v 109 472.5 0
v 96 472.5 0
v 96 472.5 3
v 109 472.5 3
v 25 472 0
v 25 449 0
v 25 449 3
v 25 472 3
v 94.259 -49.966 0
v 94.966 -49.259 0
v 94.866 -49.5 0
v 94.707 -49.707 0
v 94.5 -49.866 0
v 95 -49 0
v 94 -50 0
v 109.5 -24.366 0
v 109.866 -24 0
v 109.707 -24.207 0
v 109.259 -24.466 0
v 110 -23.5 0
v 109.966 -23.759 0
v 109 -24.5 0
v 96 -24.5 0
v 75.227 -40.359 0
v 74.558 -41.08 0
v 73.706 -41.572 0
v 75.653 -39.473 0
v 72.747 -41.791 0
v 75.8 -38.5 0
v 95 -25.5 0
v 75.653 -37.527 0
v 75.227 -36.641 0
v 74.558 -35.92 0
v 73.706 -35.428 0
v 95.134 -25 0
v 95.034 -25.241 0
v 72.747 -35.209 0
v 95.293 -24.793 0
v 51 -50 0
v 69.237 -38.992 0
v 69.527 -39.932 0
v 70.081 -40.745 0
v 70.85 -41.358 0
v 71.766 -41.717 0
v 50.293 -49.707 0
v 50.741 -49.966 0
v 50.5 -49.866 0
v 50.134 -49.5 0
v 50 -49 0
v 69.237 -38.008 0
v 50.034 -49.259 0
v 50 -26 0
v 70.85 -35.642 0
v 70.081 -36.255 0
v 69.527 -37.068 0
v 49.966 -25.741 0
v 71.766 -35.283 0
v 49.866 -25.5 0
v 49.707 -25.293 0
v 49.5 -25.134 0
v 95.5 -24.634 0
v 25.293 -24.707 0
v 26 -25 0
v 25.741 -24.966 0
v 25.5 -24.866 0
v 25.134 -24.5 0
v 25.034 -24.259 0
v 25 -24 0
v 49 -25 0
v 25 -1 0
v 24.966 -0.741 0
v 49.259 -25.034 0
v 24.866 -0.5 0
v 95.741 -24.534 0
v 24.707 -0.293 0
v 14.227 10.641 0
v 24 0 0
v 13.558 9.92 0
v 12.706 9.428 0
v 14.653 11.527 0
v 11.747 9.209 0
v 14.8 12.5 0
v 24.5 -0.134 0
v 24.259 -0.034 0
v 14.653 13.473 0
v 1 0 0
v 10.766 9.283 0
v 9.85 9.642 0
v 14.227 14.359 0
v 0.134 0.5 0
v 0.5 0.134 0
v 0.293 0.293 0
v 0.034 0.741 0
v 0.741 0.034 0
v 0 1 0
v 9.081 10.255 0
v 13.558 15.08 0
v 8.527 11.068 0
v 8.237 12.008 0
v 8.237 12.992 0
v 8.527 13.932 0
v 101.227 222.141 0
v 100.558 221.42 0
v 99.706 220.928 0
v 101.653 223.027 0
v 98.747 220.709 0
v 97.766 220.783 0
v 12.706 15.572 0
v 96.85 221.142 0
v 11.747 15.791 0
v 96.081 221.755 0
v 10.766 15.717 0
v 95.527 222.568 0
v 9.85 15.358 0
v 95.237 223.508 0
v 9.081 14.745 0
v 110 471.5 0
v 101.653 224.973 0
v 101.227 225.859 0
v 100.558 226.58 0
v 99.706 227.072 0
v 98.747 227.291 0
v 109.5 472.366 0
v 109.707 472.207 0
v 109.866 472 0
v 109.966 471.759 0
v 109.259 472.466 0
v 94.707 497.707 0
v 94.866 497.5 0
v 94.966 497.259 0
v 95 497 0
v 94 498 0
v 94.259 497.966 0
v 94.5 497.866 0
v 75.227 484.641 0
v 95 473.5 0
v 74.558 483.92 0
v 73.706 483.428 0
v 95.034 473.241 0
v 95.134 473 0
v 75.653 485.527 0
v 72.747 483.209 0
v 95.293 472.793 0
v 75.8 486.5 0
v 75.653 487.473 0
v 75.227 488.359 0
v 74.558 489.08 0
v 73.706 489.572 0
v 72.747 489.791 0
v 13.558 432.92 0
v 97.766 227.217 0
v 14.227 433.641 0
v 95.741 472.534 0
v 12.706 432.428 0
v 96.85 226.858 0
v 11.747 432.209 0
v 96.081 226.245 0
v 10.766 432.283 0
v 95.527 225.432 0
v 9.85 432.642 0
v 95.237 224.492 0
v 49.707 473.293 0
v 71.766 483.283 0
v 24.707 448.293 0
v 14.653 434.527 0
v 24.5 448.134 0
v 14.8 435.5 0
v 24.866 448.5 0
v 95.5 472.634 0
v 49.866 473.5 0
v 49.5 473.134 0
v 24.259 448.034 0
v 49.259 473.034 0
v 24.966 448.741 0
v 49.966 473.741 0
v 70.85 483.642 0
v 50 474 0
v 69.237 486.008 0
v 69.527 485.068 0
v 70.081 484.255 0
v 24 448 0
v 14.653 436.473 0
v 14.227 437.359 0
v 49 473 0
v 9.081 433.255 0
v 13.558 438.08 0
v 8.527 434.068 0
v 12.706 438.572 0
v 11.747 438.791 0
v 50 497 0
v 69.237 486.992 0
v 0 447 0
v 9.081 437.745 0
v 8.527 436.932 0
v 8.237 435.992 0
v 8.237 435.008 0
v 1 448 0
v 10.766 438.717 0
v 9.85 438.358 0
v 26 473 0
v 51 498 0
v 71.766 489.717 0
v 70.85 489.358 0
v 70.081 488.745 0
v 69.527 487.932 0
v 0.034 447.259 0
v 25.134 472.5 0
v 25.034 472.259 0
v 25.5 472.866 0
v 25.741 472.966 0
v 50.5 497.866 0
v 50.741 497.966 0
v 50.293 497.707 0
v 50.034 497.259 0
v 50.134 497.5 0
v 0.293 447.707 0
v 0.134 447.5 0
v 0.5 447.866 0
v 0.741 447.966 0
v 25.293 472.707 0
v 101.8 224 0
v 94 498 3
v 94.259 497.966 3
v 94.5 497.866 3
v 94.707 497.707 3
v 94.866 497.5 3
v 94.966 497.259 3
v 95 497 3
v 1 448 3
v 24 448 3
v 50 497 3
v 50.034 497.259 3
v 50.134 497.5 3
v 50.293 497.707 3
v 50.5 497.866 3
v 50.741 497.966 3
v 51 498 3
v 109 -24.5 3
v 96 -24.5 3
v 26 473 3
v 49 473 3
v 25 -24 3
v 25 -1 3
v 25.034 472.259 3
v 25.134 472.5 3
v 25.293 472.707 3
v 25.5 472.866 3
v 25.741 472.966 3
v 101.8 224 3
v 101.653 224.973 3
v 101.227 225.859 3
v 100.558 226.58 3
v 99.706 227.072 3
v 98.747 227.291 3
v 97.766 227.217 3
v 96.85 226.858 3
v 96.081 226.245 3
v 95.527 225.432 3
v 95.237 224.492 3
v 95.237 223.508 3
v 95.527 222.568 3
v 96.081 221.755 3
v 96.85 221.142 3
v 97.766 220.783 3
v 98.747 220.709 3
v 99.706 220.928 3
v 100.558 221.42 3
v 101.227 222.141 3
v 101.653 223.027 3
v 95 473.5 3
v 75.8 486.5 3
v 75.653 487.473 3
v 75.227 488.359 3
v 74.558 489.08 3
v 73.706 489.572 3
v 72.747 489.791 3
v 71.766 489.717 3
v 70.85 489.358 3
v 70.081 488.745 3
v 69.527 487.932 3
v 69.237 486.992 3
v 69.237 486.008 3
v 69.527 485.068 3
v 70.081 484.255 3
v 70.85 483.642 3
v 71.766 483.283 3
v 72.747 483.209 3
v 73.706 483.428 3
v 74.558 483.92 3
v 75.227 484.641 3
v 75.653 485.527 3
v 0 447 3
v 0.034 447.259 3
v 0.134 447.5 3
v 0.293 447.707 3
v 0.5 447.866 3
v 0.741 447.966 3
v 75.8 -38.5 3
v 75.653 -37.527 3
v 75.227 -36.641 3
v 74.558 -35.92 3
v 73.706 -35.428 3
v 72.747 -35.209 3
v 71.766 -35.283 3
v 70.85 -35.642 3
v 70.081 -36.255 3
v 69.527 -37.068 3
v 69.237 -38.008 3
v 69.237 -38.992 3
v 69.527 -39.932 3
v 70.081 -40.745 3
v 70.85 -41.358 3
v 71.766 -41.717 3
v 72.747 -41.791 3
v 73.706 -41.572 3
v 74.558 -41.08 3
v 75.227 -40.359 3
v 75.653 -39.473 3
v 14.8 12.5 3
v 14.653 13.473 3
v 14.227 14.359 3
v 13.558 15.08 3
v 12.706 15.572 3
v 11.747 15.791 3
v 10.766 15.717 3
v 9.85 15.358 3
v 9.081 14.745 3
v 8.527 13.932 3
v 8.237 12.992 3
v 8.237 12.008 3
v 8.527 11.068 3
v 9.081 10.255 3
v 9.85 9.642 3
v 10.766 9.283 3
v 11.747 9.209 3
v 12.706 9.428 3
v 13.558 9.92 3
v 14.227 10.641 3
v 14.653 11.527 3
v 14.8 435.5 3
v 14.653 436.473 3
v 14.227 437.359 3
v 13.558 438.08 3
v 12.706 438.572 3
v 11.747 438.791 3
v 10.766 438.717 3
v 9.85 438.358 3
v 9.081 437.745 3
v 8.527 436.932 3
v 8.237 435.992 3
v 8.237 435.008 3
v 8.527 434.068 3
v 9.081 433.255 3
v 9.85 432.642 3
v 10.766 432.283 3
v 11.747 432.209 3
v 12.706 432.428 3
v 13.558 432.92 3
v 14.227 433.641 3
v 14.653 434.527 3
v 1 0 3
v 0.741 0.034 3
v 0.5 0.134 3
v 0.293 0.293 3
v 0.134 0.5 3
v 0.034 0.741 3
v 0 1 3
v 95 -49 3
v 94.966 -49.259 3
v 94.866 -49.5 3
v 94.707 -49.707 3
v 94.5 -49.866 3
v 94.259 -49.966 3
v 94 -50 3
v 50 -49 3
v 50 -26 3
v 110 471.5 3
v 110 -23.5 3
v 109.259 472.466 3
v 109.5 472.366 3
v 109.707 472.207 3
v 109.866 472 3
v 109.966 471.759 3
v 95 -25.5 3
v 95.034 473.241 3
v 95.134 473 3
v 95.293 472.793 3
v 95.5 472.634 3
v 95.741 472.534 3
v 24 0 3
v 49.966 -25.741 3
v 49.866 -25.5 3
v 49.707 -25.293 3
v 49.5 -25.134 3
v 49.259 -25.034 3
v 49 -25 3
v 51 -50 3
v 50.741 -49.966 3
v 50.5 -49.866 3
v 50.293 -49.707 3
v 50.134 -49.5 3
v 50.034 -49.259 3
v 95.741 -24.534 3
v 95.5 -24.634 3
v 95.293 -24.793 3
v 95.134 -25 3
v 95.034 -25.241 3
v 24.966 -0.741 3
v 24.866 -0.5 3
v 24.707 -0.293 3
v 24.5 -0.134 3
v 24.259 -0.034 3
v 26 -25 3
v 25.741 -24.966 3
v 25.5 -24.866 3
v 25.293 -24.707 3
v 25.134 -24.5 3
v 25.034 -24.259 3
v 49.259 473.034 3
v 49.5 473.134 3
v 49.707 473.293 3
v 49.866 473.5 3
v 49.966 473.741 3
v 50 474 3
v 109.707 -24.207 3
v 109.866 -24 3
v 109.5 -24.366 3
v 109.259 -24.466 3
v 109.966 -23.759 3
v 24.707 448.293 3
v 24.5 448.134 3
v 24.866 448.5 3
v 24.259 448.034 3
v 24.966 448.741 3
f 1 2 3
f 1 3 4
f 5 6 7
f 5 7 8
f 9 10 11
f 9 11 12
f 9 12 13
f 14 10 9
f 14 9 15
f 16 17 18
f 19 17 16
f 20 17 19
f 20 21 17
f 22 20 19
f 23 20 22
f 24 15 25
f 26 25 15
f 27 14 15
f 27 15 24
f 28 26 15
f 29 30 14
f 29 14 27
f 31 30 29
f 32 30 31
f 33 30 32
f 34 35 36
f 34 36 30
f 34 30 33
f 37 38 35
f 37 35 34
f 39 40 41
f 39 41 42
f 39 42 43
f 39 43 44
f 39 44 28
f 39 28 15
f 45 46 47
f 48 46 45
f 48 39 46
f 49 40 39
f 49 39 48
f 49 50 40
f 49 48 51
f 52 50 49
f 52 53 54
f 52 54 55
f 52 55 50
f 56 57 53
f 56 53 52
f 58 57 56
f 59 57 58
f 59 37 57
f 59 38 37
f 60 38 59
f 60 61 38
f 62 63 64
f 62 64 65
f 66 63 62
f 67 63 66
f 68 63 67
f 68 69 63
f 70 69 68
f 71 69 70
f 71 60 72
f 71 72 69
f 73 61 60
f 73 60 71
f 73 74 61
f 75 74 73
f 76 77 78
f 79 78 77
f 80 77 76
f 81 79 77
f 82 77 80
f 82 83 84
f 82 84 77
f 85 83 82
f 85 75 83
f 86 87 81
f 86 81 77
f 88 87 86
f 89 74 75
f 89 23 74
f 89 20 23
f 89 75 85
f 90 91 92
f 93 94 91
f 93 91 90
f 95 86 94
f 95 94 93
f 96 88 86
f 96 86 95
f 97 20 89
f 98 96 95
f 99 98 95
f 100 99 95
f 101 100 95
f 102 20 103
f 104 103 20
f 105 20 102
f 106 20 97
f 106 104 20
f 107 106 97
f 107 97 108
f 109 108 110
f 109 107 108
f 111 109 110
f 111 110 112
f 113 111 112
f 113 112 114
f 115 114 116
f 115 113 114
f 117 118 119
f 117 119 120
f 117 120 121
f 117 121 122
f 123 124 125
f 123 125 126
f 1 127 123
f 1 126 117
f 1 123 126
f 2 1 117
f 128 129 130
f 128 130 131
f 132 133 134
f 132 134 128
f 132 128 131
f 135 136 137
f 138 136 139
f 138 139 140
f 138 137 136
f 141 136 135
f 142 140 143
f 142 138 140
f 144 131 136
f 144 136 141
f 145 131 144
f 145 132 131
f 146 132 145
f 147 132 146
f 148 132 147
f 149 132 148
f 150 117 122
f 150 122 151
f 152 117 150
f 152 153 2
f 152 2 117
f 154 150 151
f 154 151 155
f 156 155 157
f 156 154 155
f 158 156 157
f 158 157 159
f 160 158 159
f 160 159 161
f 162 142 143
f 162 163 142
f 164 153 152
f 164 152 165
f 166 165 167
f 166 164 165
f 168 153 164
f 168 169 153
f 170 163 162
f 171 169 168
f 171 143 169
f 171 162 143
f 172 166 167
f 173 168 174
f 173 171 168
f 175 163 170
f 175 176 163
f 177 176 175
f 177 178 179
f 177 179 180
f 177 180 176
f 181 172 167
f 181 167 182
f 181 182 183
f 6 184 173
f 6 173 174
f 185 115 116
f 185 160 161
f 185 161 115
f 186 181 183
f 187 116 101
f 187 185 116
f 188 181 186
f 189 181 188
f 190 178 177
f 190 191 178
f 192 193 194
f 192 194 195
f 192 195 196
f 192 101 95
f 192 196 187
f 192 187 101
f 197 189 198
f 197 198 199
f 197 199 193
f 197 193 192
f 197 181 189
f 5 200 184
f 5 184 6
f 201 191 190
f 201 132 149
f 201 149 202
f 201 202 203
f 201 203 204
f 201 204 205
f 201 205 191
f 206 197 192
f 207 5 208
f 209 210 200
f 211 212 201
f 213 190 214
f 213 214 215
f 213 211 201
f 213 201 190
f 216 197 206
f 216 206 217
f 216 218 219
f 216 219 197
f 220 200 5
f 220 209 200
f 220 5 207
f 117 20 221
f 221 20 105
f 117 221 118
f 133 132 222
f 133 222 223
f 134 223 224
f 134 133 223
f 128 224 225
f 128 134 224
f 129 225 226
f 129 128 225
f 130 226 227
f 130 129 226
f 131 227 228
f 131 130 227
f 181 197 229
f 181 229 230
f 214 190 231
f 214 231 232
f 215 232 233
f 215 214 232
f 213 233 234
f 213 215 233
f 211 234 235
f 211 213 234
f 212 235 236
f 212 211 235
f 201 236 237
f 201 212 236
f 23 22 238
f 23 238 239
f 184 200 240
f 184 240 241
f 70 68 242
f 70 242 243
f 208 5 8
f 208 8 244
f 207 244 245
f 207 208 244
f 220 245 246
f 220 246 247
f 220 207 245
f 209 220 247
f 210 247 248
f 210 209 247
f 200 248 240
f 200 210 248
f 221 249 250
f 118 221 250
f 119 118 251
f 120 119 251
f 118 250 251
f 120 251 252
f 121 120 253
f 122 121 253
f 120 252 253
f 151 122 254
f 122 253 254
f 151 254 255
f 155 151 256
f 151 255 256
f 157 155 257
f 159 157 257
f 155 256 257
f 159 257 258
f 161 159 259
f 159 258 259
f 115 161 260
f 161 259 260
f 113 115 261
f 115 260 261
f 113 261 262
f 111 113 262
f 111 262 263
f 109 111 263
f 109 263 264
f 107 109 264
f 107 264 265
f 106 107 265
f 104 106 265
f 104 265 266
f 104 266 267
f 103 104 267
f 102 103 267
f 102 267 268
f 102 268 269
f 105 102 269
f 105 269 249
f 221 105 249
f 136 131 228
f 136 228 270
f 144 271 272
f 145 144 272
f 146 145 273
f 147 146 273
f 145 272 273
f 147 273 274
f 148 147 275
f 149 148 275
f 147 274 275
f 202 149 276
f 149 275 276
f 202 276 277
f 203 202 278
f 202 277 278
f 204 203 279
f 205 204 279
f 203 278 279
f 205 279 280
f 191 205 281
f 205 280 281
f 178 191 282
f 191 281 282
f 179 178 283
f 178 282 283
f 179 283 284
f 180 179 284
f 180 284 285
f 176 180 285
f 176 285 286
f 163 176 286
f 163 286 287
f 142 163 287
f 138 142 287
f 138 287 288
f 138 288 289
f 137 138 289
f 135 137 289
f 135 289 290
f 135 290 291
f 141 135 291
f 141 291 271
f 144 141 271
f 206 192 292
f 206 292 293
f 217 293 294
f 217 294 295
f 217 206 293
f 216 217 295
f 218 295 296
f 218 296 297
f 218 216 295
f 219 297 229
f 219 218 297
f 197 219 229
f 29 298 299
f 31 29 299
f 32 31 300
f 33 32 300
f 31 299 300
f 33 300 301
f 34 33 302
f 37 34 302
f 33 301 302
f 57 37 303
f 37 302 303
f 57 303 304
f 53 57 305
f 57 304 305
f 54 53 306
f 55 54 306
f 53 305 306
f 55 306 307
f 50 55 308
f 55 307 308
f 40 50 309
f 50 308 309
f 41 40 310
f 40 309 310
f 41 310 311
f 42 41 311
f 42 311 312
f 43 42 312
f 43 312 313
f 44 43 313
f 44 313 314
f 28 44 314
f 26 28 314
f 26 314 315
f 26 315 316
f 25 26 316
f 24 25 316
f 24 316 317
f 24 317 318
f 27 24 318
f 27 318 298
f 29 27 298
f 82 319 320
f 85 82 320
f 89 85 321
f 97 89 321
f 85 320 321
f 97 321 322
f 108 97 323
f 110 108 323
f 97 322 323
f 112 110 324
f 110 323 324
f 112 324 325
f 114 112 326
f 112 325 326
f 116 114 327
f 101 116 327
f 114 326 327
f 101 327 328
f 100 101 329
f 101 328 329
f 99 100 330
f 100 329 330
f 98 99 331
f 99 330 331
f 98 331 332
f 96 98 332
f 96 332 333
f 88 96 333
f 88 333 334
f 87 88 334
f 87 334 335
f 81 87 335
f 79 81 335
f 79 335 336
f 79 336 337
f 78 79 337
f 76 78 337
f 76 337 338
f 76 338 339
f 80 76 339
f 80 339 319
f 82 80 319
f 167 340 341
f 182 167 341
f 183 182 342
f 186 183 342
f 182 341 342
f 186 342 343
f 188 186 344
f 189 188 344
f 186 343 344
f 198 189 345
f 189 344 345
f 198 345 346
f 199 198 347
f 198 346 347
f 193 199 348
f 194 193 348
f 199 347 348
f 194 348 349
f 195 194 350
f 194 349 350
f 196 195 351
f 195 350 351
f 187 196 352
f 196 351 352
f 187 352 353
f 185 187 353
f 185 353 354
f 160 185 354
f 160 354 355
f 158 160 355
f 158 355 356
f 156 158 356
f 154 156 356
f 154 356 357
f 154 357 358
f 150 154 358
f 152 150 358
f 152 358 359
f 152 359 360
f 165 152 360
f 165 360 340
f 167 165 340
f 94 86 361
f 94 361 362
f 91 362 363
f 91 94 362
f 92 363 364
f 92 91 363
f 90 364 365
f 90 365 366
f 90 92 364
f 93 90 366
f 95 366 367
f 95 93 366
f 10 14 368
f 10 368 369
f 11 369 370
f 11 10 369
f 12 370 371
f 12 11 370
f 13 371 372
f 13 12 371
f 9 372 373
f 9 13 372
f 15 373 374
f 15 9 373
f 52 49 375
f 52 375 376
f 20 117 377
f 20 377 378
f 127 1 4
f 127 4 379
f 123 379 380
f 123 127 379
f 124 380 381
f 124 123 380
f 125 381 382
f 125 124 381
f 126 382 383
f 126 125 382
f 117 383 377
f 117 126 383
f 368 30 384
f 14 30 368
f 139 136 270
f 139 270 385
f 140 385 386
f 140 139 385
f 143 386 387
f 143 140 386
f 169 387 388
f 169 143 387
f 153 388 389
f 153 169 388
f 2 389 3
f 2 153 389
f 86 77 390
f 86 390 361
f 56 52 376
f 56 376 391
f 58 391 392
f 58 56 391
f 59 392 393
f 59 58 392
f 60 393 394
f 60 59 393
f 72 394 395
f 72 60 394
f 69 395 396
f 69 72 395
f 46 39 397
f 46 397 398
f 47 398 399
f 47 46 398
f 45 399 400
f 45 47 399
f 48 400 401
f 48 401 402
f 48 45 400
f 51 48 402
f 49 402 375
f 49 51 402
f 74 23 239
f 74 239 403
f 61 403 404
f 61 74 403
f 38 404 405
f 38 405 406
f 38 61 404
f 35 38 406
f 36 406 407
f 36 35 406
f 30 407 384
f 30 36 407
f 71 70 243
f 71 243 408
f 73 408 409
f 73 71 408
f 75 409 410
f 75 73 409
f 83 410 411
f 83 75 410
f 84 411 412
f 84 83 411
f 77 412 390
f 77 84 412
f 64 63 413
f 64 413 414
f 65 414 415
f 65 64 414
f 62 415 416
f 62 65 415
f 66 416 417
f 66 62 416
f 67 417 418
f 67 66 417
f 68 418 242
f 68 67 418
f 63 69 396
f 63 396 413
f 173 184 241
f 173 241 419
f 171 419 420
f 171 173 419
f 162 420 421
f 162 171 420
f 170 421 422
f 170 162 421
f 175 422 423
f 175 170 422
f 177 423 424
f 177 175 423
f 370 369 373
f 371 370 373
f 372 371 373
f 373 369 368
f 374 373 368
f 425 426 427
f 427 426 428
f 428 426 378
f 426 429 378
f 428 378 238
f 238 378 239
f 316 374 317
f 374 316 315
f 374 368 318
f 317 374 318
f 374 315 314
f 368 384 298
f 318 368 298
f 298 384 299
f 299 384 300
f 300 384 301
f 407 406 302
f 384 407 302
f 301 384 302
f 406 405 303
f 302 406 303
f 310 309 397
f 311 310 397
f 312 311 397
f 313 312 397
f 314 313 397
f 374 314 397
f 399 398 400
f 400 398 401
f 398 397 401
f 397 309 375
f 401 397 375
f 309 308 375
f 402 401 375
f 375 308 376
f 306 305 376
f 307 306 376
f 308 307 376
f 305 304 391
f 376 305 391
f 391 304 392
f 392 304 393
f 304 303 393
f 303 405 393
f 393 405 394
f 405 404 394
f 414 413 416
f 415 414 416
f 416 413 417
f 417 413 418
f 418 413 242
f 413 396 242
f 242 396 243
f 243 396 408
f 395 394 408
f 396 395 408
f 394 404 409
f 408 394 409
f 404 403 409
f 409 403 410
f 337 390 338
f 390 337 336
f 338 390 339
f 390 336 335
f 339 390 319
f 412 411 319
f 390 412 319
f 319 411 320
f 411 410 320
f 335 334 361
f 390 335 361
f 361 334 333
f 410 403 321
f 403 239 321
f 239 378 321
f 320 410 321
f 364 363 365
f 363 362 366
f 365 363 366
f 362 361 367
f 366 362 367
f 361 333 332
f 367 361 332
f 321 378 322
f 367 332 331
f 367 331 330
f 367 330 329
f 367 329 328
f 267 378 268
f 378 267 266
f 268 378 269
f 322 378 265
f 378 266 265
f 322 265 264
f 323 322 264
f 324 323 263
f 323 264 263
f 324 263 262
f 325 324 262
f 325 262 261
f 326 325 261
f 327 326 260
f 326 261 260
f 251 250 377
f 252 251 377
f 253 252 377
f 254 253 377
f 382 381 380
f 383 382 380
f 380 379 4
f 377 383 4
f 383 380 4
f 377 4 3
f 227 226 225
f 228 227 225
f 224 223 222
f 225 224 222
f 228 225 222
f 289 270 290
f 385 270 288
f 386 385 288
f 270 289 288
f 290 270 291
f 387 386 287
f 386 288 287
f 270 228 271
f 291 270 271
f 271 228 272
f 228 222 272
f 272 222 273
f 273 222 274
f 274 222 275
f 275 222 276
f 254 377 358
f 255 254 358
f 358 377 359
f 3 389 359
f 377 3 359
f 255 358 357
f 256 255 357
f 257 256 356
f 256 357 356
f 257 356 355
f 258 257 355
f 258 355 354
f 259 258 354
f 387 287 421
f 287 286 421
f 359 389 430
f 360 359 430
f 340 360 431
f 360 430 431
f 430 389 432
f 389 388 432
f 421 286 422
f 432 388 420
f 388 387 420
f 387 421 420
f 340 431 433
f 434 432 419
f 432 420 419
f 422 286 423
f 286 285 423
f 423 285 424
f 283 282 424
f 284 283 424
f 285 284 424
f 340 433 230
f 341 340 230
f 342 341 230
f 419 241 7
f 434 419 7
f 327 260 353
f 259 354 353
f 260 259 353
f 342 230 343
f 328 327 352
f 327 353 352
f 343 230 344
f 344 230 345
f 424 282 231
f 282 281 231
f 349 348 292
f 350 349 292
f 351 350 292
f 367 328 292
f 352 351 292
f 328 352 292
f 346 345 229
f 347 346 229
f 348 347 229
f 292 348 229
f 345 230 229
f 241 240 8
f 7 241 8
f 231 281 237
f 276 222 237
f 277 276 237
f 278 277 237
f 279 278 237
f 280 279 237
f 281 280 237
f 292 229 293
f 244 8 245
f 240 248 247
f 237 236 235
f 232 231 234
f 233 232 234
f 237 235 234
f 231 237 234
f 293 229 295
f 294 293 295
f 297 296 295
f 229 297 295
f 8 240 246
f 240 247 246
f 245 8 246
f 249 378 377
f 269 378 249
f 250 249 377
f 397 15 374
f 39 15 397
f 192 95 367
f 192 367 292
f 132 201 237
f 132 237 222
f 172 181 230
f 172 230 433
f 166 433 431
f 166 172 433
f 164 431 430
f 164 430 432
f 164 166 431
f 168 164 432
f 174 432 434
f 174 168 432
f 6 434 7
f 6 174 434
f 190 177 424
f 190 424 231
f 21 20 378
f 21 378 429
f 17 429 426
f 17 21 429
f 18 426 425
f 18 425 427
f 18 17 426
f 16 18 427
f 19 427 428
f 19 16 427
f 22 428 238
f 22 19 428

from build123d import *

# Parameters (mm, degrees)
BOSS_EXTRUDE1_DEPTH  = 3
M6_CLEARANCE_HOLE1_D = 6.6
M6_CLEARANCE_HOLE2_D = 6.6


with BuildPart() as part:
    # Sketch1 → Boss-Extrude1 (new body)
    with BuildSketch(Plane.XY):
        with BuildLine():
            Line((26, 473), (49, 473))
            ThreePointArc((49, 473), (49.707106781, 473.292893219), (50, 474))
            Line((50, 474), (50, 497))
            ThreePointArc((50, 497), (50.292893219, 497.707106781), (51, 498))
            Line((51, 498), (94, 498))
            ThreePointArc((94, 498), (94.707106781, 497.707106781), (95, 497))
            Line((95, 497), (95, 473.5))
            ThreePointArc((95, 473.5), (95.292893219, 472.792893219), (96, 472.5))
            Line((96, 472.5), (109, 472.5))
            ThreePointArc((109, 472.5), (109.707106781, 472.207106781), (110, 471.5))
            Line((110, 471.5), (110, -23.5))
            ThreePointArc((110, -23.5), (109.707106781, -24.207106781), (109, -24.5))
            Line((109, -24.5), (96, -24.5))
            ThreePointArc((96, -24.5), (95.292893219, -24.792893219), (95, -25.5))
            Line((95, -25.5), (95, -49))
            ThreePointArc((95, -49), (94.707106781, -49.707106781), (94, -50))
            Line((94, -50), (51, -50))
            ThreePointArc((51, -50), (50.292893219, -49.707106781), (50, -49))
            Line((50, -49), (50, -26))
            ThreePointArc((50, -26), (49.707106781, -25.292893219), (49, -25))
            Line((49, -25), (26, -25))
            ThreePointArc((26, -25), (25.292893219, -24.707106781), (25, -24))
            Line((25, -24), (25, -1))
            ThreePointArc((25, -1), (24.707106781, -0.292893219), (24, 0))
            Line((24, 0), (1, 0))
            ThreePointArc((1, 0), (0.292893219, 0.292893219), (0, 1))
            Line((0, 1), (0, 447))
            ThreePointArc((0, 447), (0.292893219, 447.707106781), (1, 448))
            Line((1, 448), (24, 448))
            ThreePointArc((24, 448), (24.707106781, 448.292893219), (25, 449))
            Line((25, 449), (25, 472))
            ThreePointArc((25, 472), (25.292893219, 472.707106781), (26, 473))
        make_face()
    extrude(amount=BOSS_EXTRUDE1_DEPTH)

    # M6 Clearance Hole1 (through all)
    with Locations(Plane(origin=(0, 0, 0), x_dir=(-1, 0, 0), z_dir=(0, 0, -1))):
        with Locations((-72.5, -38.5), (-11.5, 12.5), (-11.5, 435.5), (-72.5, 486.5)):
            Hole(M6_CLEARANCE_HOLE1_D / 2)

    # M6 Clearance Hole2 (through all)
    with Locations(Plane(origin=(0, 0, 0), x_dir=(-1, 0, 0), z_dir=(0, 0, -1))):
        with Locations((-98.5, 224)):
            Hole(M6_CLEARANCE_HOLE2_D / 2)


solid = part.part
